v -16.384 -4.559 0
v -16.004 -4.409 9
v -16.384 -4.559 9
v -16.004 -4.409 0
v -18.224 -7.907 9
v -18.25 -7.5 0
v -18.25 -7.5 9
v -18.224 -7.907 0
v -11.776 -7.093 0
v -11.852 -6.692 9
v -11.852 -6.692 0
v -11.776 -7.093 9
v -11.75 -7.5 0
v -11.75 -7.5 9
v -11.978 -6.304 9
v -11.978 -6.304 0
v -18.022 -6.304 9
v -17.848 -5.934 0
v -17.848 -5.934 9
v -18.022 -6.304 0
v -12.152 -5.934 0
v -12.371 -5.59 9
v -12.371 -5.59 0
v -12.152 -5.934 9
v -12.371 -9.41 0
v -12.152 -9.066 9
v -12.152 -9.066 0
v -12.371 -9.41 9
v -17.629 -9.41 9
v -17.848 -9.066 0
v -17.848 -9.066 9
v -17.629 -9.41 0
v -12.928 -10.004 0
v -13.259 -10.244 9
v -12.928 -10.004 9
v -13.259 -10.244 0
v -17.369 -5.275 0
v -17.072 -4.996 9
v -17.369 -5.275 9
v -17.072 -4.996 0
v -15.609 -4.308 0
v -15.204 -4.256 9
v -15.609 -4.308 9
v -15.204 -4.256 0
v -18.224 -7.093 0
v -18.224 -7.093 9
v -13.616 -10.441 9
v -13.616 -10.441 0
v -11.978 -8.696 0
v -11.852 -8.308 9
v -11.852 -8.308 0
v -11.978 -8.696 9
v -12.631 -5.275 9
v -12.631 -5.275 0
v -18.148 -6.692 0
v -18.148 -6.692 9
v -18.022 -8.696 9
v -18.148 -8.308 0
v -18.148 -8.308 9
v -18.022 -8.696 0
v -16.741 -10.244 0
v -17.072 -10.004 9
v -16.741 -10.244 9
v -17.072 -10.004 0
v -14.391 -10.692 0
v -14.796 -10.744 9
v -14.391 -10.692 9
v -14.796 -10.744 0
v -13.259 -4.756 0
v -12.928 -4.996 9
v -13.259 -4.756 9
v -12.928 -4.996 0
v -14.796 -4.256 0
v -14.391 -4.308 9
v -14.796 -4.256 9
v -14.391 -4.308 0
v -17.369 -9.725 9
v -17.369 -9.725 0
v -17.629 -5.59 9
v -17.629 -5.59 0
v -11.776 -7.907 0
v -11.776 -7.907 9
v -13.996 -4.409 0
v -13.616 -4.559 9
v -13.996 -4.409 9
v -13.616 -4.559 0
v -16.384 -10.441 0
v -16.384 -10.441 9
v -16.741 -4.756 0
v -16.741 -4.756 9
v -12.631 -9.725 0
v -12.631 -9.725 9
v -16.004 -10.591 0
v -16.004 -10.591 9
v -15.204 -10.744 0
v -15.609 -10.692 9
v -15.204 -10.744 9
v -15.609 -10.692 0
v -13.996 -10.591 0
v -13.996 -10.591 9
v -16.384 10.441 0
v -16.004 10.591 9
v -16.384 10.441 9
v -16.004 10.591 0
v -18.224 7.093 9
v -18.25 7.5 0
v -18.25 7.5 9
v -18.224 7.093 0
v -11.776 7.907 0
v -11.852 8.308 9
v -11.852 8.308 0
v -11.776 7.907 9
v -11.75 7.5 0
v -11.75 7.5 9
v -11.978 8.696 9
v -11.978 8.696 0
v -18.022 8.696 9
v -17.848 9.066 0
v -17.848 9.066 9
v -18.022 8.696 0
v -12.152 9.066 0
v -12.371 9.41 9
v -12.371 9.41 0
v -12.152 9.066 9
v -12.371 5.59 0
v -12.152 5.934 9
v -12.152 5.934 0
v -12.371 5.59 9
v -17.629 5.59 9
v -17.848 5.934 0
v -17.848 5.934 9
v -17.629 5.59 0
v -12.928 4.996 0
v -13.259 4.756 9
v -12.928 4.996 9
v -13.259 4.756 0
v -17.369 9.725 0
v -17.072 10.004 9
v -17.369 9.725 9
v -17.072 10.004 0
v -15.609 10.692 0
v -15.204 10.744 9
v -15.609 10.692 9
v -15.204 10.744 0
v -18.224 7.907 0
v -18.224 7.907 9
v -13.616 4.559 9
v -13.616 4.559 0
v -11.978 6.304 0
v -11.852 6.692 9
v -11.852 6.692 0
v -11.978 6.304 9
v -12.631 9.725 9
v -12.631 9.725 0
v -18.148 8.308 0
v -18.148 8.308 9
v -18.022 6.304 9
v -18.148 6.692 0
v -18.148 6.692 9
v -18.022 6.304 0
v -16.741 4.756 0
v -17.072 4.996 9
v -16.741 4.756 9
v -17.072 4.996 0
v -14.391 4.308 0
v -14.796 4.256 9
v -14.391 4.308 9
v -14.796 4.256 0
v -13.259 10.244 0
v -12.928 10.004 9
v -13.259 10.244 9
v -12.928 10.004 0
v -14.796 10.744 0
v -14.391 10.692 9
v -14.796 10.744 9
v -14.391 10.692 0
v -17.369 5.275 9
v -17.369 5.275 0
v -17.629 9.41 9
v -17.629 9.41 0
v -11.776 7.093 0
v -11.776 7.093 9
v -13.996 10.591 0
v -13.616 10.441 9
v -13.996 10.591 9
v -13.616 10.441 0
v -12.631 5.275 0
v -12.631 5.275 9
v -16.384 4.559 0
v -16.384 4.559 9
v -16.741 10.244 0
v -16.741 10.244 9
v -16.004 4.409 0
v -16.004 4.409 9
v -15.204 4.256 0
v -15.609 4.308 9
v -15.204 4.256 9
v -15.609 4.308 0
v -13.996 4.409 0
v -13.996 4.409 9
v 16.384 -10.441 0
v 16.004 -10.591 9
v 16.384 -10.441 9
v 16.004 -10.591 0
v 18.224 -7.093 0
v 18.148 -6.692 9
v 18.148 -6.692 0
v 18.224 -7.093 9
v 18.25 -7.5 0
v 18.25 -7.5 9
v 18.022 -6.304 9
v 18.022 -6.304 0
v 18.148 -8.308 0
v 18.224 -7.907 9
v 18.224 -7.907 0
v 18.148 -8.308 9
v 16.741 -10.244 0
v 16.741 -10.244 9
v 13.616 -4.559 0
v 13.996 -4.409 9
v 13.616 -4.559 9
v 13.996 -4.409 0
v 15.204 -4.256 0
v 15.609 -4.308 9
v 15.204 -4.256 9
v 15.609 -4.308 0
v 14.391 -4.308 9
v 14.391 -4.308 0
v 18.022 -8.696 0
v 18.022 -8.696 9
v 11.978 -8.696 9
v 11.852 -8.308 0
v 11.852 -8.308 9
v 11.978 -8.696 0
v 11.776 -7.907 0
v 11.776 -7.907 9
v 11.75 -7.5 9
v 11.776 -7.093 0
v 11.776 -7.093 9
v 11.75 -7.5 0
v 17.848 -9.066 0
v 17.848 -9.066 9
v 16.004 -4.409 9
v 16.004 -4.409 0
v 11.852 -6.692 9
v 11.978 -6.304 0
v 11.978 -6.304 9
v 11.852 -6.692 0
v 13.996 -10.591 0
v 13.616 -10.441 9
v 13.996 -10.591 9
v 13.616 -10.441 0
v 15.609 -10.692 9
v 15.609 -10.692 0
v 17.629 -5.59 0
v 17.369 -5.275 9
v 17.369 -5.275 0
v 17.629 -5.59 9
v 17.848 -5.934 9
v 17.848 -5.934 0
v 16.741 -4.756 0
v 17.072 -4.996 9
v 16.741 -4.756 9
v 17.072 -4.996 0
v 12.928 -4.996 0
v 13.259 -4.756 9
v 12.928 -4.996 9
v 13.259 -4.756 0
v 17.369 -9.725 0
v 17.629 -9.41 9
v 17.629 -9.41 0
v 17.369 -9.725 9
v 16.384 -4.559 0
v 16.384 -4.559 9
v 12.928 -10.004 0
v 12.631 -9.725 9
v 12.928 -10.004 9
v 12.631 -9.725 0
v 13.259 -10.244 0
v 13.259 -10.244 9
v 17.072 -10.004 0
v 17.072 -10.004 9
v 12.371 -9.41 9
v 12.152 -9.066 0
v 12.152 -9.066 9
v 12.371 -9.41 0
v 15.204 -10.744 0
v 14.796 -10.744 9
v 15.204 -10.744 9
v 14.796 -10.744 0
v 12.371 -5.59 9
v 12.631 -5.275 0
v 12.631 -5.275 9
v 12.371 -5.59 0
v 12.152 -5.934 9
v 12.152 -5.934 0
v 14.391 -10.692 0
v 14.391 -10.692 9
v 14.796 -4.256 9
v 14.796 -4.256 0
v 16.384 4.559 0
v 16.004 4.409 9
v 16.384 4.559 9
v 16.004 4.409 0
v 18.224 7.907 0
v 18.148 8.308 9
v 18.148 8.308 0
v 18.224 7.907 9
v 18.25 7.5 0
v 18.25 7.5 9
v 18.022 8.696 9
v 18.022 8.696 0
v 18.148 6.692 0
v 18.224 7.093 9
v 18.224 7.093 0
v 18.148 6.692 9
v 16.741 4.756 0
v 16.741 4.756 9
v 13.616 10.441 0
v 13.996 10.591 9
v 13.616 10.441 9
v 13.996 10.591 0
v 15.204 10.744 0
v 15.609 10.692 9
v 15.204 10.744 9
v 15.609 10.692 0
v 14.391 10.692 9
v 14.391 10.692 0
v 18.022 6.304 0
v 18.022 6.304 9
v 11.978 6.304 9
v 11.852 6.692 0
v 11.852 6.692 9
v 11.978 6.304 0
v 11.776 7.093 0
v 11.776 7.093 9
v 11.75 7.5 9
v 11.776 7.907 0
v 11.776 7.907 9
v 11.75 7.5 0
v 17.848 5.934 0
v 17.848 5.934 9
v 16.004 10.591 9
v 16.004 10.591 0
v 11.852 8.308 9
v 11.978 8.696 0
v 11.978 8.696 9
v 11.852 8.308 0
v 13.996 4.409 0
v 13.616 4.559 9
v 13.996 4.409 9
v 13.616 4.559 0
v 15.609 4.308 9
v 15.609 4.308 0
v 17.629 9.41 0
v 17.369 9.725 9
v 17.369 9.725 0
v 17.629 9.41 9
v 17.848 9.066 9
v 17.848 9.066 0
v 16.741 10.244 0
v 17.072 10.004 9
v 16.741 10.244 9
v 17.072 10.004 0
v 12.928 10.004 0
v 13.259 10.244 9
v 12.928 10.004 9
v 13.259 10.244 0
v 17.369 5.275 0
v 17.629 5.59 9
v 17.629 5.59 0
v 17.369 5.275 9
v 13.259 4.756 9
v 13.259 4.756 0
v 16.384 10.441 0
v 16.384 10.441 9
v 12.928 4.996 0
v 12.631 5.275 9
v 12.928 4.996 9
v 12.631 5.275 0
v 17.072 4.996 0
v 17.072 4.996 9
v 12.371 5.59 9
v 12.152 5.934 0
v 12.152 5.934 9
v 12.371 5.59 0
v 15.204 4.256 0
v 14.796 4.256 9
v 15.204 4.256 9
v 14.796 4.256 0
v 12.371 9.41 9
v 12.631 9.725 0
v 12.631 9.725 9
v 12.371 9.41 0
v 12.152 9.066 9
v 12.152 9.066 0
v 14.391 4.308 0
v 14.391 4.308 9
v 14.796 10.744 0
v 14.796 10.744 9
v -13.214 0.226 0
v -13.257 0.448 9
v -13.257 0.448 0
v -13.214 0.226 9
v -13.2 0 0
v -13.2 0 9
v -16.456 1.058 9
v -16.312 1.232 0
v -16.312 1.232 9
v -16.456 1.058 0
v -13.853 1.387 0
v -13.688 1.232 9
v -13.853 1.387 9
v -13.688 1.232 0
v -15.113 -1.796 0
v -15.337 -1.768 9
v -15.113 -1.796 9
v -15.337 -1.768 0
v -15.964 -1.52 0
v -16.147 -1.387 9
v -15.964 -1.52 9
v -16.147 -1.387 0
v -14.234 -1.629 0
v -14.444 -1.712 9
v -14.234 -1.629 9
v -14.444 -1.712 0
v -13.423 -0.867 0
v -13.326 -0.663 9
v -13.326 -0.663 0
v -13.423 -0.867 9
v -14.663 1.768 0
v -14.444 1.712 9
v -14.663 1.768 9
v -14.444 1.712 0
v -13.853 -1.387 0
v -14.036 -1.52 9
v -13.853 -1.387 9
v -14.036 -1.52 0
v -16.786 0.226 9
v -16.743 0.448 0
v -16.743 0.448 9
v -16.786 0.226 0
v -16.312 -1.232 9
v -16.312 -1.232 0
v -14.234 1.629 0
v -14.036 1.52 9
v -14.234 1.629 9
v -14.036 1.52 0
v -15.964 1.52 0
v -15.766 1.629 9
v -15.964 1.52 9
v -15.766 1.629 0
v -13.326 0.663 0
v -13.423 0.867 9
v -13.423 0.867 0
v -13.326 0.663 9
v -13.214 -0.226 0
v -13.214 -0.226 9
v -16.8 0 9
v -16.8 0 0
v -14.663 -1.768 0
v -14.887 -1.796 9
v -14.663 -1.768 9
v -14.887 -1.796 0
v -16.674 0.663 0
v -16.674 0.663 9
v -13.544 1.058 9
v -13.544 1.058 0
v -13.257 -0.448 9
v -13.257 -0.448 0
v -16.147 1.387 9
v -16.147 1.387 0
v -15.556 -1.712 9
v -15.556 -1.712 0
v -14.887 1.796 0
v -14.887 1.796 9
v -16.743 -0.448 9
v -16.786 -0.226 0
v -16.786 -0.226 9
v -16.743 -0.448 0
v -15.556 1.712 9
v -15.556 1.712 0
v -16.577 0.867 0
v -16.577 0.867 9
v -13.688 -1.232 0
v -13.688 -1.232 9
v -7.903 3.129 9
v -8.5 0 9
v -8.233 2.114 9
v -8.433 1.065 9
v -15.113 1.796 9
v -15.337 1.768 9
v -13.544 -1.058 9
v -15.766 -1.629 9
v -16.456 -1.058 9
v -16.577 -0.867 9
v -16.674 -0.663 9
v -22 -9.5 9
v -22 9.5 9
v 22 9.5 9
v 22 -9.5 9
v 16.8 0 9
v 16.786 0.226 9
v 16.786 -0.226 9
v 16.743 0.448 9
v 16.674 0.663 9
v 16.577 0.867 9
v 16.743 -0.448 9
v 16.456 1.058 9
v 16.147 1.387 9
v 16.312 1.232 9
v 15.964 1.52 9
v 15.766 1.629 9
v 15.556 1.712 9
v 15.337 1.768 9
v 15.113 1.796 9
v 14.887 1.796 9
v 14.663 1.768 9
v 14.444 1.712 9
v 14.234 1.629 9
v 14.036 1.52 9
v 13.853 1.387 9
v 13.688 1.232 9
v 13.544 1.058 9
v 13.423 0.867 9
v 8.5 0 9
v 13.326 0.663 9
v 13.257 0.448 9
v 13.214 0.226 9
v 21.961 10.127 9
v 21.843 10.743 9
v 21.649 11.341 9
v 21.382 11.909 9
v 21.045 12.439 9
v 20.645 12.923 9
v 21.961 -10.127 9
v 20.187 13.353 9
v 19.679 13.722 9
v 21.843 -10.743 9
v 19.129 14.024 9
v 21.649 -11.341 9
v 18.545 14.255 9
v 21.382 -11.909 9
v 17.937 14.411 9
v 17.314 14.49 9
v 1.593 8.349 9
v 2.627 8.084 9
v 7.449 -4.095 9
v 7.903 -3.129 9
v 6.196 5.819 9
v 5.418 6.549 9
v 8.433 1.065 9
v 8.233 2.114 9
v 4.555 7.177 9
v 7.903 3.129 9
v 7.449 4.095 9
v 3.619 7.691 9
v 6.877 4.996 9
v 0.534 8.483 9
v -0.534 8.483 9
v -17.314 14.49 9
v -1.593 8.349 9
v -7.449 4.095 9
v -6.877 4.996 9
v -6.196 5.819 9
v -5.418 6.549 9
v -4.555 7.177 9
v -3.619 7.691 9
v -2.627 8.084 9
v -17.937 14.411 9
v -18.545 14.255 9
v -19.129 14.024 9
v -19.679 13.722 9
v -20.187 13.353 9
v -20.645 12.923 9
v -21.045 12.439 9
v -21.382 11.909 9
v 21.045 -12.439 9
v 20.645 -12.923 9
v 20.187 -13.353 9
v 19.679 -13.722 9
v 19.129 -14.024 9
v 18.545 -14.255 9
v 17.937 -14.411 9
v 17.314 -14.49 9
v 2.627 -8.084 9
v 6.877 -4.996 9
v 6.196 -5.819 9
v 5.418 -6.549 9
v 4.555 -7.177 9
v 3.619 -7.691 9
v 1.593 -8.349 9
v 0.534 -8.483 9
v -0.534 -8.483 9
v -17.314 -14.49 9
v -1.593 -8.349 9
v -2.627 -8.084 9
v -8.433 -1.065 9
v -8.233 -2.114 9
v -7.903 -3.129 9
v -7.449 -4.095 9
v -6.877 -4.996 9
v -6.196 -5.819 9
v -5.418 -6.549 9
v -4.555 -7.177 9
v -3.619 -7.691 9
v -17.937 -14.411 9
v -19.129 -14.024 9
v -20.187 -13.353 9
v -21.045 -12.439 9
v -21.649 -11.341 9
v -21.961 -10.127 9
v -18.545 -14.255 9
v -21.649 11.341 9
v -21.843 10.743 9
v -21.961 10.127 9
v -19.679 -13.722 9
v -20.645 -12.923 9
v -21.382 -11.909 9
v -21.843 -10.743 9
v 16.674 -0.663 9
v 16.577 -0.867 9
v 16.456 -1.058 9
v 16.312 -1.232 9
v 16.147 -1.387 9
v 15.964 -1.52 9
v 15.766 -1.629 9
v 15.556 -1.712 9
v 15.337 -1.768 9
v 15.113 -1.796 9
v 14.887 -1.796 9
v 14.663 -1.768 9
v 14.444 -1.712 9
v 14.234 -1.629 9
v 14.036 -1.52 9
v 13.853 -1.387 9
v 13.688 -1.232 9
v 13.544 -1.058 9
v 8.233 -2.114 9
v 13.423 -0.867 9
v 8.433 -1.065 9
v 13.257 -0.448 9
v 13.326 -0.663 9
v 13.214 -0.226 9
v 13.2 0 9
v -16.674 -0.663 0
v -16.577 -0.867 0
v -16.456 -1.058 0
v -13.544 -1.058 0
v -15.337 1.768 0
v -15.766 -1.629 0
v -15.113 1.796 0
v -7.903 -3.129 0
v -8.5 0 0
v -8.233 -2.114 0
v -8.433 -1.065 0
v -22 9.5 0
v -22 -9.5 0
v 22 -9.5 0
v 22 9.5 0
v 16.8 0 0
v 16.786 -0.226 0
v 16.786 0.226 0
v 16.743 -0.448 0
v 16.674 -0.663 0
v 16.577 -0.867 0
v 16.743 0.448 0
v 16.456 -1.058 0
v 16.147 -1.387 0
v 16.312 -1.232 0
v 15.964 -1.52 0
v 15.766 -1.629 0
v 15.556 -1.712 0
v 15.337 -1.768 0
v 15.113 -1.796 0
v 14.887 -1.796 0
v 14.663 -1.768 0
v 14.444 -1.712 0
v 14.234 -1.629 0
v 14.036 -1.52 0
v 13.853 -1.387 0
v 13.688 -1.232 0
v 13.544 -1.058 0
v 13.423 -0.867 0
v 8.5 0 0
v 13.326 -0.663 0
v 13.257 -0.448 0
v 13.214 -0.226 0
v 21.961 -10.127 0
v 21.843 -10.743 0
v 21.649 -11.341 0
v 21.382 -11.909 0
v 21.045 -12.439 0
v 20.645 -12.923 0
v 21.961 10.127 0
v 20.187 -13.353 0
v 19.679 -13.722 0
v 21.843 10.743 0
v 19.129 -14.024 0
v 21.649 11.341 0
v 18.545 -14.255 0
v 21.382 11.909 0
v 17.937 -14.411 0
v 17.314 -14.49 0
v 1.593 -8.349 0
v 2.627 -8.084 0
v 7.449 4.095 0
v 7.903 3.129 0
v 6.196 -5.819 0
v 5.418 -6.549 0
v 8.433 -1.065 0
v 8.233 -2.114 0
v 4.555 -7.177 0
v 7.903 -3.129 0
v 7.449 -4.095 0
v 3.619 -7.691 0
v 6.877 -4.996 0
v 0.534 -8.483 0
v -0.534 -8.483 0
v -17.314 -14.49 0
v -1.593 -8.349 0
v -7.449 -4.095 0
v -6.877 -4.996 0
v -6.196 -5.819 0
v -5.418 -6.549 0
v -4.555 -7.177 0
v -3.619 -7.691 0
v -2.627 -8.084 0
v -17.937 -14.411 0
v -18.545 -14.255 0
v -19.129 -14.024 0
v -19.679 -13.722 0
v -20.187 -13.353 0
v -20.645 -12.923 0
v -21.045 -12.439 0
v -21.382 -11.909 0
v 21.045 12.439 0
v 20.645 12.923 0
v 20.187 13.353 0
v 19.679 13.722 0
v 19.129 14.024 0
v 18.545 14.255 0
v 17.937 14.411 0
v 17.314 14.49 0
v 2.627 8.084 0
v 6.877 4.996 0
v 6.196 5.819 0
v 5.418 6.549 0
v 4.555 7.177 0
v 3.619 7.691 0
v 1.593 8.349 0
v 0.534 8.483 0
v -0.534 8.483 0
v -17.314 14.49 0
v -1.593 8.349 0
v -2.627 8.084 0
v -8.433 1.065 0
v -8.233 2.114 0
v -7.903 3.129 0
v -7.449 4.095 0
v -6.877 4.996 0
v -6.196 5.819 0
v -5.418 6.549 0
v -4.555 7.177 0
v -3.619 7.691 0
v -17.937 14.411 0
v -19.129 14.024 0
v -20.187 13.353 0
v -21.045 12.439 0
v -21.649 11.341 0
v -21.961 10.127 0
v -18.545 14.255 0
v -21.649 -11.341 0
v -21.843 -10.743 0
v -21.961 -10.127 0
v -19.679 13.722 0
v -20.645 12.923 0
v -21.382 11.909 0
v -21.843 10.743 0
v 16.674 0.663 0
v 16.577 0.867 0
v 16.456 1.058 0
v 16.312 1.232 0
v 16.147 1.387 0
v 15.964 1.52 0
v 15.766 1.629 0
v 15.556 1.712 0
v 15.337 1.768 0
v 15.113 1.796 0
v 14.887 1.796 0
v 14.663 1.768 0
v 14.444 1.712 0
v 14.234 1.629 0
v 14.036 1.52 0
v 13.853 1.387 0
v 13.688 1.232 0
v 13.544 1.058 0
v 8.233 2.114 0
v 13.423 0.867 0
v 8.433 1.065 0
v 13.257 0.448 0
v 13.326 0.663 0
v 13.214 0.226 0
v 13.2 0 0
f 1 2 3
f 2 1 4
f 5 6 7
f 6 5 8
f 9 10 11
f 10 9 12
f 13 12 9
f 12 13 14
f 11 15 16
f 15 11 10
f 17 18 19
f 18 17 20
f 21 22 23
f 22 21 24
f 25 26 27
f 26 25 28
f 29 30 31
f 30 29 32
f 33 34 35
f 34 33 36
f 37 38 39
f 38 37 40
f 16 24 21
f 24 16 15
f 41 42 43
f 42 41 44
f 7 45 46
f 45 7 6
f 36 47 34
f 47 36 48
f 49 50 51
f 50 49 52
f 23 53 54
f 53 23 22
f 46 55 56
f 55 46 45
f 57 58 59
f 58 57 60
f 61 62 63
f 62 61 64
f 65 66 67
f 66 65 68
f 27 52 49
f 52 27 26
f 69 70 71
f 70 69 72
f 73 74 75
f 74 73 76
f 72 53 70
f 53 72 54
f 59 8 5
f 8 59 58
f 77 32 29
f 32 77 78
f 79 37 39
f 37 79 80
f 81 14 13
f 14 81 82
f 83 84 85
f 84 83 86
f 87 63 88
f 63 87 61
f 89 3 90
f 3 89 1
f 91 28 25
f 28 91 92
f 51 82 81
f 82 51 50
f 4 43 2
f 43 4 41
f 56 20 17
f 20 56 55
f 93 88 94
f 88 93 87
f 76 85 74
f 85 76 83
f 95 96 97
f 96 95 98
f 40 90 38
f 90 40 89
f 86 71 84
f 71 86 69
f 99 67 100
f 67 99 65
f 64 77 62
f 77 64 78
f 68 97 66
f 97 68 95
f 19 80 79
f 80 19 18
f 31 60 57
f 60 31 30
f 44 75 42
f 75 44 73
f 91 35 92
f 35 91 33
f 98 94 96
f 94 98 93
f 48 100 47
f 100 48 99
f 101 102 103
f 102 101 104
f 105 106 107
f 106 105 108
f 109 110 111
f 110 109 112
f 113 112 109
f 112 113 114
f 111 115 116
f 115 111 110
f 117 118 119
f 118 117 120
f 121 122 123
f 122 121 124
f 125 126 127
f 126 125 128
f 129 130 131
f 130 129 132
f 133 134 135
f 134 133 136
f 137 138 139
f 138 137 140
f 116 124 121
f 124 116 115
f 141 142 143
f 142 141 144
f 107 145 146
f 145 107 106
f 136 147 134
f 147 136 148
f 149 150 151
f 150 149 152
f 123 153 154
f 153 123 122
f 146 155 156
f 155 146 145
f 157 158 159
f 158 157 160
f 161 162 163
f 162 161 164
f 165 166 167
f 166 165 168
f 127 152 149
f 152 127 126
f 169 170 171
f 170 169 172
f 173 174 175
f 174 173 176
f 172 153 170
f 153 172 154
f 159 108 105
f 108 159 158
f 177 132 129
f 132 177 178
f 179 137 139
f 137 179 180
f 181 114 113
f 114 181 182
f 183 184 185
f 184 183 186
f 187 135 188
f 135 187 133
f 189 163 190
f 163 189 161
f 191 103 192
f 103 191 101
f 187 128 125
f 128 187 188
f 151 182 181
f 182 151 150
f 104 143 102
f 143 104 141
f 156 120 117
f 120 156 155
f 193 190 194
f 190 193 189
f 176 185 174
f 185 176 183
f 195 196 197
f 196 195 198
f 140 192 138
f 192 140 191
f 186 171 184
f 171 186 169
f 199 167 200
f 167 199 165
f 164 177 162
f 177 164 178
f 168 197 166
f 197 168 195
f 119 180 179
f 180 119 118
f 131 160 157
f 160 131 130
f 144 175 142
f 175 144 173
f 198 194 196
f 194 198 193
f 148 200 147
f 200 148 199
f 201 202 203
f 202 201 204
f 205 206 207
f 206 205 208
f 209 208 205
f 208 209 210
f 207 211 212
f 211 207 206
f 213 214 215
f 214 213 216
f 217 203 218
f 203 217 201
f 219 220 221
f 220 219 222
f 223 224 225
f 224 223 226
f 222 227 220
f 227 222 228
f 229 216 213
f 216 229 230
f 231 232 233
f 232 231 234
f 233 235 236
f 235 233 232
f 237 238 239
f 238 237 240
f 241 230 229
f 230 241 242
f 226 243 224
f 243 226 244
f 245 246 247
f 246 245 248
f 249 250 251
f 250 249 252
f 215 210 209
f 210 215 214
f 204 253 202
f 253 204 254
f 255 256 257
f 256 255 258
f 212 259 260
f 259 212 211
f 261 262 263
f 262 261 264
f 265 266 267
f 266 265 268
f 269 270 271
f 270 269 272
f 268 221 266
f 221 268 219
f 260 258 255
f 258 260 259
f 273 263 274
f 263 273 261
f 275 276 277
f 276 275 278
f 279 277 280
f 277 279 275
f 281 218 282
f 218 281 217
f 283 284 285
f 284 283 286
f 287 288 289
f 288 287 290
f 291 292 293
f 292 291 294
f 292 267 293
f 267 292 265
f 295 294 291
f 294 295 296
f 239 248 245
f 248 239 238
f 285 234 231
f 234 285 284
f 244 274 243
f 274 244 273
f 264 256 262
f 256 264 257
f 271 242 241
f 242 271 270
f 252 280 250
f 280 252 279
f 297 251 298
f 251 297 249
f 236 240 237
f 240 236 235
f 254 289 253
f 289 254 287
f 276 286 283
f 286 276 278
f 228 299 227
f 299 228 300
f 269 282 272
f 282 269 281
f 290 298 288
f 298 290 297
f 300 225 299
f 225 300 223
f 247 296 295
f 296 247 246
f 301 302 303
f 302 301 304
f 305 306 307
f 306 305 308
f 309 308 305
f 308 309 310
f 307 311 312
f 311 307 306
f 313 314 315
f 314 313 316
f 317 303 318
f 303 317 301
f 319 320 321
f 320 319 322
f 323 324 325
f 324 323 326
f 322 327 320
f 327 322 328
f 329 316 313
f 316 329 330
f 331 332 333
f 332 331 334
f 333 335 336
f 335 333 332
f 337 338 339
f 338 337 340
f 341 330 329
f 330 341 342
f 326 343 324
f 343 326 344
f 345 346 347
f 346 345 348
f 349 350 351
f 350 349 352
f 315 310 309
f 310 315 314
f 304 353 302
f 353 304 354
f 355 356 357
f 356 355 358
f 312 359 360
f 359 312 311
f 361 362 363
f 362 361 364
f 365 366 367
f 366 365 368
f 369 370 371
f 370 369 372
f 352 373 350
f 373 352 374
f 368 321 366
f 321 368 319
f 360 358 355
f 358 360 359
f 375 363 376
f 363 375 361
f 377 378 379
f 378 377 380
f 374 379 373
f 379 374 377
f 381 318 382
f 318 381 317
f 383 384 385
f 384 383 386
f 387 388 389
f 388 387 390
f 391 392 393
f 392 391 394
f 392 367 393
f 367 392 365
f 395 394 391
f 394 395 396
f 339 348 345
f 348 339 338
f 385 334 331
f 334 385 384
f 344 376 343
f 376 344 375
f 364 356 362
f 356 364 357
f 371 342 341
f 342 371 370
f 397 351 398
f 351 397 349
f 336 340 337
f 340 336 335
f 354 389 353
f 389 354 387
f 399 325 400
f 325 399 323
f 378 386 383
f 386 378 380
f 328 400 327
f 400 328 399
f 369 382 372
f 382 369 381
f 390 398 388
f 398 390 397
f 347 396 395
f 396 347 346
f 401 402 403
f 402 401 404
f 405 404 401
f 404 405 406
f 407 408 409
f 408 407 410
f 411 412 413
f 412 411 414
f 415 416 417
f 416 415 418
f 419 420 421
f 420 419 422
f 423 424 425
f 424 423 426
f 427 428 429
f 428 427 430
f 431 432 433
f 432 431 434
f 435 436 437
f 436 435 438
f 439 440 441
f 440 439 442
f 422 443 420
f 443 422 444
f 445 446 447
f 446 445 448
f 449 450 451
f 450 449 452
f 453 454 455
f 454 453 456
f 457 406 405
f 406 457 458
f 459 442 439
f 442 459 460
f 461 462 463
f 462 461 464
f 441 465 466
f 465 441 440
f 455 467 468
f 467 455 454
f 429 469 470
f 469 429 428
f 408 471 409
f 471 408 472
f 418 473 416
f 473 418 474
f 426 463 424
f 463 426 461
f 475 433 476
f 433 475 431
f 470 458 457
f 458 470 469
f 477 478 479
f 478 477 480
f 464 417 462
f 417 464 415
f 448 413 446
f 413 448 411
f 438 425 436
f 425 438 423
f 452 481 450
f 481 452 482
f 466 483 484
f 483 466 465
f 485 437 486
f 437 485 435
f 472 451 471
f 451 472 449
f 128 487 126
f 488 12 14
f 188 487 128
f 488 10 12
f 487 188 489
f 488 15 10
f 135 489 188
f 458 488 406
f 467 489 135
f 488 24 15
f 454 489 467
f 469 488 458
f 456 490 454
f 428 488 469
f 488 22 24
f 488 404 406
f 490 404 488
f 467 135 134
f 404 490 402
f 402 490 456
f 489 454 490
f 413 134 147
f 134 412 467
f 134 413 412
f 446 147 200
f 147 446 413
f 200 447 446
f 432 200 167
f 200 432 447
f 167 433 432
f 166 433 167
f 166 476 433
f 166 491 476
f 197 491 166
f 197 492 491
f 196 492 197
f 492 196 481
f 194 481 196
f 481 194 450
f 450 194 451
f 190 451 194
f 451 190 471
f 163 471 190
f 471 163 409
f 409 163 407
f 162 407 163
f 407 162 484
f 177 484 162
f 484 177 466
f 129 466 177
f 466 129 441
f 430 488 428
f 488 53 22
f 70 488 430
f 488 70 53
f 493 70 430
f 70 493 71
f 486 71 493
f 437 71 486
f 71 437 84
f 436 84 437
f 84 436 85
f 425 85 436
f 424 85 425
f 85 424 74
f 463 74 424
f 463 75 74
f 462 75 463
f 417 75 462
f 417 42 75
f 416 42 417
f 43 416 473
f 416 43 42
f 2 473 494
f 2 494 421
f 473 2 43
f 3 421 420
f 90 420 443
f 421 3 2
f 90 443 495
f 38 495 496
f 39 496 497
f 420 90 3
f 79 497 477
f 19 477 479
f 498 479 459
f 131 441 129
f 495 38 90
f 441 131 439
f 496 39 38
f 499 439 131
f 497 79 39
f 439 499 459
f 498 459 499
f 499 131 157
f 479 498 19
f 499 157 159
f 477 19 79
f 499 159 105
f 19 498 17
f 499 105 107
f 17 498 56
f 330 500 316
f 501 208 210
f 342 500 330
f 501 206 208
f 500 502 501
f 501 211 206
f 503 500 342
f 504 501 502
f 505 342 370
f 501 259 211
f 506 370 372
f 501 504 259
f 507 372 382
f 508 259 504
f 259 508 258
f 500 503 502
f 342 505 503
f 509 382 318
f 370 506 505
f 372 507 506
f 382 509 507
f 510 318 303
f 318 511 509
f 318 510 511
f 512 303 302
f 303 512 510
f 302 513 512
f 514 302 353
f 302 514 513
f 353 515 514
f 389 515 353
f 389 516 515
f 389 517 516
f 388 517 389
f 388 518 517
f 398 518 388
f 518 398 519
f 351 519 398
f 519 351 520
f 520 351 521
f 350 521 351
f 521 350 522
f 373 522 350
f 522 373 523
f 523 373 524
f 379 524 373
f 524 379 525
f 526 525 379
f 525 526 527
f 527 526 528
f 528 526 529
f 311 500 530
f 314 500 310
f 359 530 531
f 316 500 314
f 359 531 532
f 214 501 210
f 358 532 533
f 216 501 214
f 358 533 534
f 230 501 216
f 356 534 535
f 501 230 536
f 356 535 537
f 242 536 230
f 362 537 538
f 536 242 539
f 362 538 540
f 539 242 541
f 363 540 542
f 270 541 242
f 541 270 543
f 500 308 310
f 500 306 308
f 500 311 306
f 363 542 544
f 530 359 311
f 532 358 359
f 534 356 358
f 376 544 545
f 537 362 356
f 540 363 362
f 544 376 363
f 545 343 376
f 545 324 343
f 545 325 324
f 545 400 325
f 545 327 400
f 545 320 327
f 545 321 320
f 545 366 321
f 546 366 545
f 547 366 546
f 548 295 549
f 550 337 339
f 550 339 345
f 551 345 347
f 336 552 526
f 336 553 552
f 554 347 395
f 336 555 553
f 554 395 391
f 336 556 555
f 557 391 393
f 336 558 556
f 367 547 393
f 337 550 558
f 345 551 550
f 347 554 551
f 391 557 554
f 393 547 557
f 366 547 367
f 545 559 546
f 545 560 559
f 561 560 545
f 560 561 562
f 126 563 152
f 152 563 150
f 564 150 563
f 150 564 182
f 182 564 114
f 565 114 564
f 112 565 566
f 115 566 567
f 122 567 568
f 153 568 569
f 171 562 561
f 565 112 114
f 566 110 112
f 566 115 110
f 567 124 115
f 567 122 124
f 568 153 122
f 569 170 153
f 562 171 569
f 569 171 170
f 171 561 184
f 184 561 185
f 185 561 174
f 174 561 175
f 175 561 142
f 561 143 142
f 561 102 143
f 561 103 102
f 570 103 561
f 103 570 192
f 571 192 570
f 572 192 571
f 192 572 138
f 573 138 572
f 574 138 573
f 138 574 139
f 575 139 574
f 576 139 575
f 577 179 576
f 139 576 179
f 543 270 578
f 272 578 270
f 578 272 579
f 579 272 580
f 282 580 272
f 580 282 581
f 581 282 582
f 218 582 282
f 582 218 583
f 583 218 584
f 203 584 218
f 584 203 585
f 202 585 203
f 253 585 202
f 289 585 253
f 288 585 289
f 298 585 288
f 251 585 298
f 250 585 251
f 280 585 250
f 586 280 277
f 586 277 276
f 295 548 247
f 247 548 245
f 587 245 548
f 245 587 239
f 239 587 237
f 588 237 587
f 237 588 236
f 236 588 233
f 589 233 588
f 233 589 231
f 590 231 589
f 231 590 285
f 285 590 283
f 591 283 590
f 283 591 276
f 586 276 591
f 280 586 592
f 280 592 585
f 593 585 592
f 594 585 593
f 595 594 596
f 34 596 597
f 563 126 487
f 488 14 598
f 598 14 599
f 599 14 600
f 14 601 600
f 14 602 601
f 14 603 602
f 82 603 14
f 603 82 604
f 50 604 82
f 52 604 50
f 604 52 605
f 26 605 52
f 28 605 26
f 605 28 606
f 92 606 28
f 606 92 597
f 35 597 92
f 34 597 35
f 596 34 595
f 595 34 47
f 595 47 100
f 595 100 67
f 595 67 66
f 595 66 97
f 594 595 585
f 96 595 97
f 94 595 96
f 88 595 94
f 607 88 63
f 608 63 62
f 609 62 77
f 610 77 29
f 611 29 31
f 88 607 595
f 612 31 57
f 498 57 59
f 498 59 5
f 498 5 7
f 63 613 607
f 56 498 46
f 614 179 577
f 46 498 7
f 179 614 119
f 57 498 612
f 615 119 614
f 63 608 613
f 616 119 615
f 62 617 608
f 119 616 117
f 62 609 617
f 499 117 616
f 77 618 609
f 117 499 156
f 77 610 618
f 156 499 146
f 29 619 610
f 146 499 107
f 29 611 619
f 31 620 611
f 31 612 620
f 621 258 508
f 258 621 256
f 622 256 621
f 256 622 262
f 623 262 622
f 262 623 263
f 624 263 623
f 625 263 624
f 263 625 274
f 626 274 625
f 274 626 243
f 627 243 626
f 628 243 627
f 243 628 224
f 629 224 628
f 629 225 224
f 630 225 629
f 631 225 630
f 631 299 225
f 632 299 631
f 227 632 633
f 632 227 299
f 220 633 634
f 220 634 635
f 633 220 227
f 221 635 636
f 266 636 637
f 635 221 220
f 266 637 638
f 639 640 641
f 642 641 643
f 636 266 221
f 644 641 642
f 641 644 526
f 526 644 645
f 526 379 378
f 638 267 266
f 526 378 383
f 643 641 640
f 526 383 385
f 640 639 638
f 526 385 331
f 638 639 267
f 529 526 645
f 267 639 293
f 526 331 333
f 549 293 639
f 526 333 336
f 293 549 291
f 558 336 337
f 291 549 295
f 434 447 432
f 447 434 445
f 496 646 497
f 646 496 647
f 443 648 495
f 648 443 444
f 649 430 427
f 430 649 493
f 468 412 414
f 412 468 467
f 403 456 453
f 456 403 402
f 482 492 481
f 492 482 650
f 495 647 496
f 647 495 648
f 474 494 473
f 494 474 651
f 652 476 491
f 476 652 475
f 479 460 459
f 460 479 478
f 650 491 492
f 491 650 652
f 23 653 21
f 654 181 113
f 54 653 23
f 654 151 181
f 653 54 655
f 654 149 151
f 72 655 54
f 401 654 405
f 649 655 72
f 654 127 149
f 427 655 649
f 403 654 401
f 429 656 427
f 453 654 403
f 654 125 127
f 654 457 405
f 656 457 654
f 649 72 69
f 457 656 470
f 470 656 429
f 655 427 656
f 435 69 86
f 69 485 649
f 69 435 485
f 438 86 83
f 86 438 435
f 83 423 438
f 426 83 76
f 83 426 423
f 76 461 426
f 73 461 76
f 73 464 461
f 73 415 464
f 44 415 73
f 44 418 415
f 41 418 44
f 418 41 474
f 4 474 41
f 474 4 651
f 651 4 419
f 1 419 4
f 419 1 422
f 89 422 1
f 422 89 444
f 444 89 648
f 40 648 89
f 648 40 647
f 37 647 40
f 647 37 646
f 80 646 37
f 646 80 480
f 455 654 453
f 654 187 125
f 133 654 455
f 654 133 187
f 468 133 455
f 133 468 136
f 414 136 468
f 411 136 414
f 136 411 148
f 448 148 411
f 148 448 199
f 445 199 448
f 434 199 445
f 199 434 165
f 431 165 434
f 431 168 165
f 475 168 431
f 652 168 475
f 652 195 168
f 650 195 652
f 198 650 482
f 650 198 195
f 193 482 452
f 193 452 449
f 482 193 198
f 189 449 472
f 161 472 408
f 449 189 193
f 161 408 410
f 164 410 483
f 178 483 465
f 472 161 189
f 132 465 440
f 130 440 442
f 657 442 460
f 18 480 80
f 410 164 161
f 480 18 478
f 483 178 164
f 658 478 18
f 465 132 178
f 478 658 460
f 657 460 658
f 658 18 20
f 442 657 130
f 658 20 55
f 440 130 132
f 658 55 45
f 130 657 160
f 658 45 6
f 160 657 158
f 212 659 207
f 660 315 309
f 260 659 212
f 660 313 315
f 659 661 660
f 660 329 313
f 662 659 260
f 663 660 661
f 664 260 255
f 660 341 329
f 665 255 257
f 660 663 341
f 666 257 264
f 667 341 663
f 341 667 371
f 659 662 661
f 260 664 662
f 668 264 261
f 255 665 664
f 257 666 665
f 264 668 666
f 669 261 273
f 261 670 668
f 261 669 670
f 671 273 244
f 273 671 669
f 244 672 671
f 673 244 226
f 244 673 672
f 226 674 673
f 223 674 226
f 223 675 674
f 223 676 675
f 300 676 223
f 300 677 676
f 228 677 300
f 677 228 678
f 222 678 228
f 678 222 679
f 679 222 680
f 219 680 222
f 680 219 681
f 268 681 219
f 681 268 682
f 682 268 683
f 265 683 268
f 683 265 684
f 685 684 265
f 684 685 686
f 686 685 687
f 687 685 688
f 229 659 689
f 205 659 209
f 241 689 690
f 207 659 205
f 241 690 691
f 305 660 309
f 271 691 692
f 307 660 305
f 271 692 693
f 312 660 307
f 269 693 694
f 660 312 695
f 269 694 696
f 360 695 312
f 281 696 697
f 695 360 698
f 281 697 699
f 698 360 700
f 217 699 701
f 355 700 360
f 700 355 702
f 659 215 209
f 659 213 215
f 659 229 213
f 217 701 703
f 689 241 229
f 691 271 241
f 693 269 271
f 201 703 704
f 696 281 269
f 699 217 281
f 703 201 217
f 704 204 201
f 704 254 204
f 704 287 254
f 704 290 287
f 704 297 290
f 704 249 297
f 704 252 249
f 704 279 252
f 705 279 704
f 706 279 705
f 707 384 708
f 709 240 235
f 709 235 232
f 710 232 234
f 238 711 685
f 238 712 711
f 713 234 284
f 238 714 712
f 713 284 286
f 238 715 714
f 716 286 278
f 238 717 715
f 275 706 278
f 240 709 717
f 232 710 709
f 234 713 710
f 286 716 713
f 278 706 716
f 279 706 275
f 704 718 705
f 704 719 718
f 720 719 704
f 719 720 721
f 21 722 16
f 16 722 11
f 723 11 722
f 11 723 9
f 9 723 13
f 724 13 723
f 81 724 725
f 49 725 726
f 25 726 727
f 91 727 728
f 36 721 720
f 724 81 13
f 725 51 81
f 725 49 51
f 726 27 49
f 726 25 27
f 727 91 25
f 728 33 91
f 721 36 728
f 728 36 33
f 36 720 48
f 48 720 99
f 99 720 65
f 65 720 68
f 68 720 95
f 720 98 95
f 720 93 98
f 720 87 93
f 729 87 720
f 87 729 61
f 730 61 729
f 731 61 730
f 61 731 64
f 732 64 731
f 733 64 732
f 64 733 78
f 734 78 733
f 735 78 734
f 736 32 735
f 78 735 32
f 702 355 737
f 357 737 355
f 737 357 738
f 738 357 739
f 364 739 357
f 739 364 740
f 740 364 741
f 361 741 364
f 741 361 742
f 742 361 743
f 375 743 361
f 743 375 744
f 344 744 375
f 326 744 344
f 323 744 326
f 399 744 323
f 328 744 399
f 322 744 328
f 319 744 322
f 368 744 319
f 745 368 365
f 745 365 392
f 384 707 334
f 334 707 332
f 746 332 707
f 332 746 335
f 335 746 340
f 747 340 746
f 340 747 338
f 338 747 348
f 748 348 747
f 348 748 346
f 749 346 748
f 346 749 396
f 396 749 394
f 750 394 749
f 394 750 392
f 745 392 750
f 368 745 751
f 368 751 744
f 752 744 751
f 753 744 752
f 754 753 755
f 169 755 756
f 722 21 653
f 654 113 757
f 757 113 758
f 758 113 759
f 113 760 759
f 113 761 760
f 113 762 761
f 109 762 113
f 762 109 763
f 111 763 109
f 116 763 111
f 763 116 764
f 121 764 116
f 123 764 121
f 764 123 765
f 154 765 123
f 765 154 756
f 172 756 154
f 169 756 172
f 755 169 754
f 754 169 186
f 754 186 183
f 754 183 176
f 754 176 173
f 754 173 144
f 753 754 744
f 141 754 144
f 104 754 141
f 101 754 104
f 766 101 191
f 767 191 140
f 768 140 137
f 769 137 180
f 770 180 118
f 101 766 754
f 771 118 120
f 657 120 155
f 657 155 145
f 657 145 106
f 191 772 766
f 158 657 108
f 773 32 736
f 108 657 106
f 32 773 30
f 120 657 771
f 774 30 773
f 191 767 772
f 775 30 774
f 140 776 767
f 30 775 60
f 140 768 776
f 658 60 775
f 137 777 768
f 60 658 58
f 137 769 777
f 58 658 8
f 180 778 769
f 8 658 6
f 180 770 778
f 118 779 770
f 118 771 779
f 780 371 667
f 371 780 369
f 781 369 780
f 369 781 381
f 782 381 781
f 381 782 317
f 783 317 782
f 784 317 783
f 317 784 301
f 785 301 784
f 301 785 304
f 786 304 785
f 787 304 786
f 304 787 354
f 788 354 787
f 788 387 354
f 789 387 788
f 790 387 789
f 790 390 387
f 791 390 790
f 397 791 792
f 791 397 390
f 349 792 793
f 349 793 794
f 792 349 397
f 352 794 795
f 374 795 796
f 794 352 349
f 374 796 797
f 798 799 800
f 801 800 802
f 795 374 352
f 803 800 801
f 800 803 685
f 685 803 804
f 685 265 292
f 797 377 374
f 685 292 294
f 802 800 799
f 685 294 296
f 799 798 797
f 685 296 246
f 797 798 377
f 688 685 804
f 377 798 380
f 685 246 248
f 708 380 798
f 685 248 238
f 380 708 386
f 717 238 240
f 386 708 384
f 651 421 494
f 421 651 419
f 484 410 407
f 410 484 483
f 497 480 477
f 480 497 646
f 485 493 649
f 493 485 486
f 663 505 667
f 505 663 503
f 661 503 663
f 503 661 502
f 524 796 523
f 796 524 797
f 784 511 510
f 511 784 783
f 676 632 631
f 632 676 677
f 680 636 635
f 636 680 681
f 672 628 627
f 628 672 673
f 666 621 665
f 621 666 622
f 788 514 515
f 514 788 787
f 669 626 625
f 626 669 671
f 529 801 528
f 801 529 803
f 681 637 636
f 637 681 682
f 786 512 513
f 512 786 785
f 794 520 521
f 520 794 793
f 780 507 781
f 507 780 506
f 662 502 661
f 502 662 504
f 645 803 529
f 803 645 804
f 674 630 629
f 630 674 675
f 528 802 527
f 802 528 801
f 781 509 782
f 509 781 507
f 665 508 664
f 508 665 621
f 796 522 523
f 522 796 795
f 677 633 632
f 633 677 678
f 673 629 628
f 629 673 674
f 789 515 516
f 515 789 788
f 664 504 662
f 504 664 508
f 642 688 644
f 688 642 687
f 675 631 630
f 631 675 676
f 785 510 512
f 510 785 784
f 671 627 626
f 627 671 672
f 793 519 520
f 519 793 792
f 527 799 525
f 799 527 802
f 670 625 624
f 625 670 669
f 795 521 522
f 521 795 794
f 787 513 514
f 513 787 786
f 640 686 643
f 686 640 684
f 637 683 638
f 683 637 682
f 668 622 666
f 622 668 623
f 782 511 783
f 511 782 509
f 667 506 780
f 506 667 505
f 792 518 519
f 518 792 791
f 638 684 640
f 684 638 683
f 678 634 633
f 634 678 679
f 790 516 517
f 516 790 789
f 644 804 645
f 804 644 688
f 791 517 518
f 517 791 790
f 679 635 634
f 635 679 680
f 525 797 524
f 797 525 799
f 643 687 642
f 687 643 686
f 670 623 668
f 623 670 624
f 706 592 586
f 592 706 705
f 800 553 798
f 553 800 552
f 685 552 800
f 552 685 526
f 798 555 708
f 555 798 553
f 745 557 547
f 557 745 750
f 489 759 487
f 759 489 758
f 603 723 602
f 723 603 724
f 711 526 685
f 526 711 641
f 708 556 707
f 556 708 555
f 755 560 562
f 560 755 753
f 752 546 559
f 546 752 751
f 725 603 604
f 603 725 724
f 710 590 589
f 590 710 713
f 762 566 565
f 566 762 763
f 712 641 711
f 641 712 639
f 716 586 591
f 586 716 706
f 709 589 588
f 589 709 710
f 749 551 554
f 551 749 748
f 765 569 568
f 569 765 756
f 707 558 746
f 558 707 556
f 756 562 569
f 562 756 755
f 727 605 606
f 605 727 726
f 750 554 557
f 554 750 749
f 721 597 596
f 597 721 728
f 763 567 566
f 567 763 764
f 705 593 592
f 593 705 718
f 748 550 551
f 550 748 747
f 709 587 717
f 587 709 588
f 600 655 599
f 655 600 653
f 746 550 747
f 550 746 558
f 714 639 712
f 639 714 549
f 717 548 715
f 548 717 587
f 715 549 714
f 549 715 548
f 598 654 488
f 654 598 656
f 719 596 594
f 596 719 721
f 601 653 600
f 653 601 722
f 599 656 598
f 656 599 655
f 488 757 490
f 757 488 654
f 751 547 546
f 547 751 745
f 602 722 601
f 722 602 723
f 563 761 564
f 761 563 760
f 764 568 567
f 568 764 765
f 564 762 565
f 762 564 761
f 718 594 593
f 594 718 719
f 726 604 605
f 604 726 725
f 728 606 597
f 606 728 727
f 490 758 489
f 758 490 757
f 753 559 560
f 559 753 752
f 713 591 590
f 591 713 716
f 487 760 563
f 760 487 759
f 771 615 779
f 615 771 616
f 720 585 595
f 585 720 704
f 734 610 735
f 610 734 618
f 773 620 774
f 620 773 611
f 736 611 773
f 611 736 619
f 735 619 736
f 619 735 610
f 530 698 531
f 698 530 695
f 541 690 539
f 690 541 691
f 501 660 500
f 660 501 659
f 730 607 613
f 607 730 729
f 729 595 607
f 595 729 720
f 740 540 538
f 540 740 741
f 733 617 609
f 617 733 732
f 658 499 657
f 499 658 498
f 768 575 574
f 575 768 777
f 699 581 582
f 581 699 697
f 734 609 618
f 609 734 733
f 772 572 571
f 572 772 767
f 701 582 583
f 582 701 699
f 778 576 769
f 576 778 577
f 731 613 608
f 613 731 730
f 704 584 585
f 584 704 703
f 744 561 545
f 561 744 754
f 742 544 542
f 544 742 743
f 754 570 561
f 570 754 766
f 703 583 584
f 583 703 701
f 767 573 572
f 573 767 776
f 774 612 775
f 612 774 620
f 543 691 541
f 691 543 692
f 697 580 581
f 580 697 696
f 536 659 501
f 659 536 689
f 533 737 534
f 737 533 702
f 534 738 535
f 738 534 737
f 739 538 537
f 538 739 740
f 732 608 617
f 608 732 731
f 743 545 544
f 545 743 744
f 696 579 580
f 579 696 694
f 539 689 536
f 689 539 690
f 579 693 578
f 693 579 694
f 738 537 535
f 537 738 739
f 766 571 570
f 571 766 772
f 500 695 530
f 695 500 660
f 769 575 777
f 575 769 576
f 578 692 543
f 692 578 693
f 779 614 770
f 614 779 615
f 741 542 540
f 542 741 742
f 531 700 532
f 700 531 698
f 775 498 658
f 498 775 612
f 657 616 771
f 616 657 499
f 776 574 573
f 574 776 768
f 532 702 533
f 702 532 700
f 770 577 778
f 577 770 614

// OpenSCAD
$fn = 50;


difference() {
	union() {
		hull() {
			translate(v = [-17.0000000000, 9.5000000000, 0]) {
				cylinder(h = 9, r = 5);
			}
			translate(v = [17.0000000000, 9.5000000000, 0]) {
				cylinder(h = 9, r = 5);
			}
			translate(v = [-17.0000000000, -9.5000000000, 0]) {
				cylinder(h = 9, r = 5);
			}
			translate(v = [17.0000000000, -9.5000000000, 0]) {
				cylinder(h = 9, r = 5);
			}
		}
	}
	union() {
		#translate(v = [-15.0000000000, -7.5000000000, 0]) {
			cylinder(h = 9, r = 3.2500000000);
		}
		#translate(v = [-15.0000000000, 7.5000000000, 0]) {
			cylinder(h = 9, r = 3.2500000000);
		}
		#translate(v = [15.0000000000, -7.5000000000, 0]) {
			cylinder(h = 9, r = 3.2500000000);
		}
		#translate(v = [15.0000000000, 7.5000000000, 0]) {
			cylinder(h = 9, r = 3.2500000000);
		}
		#translate(v = [-15.0000000000, -7.5000000000, -100.0000000000]) {
			cylinder(h = 200, r = 3.2500000000);
		}
		#translate(v = [-15.0000000000, 7.5000000000, -100.0000000000]) {
			cylinder(h = 200, r = 3.2500000000);
		}
		#translate(v = [15.0000000000, -7.5000000000, -100.0000000000]) {
			cylinder(h = 200, r = 3.2500000000);
		}
		#translate(v = [15.0000000000, 7.5000000000, -100.0000000000]) {
			cylinder(h = 200, r = 3.2500000000);
		}
		#translate(v = [-15.0000000000, -7.5000000000, 0]) {
			cylinder(h = 9, r = 1.8000000000);
		}
		#translate(v = [-15.0000000000, 0.0000000000, 0]) {
			cylinder(h = 9, r = 1.8000000000);
		}
		#translate(v = [-15.0000000000, 7.5000000000, 0]) {
			cylinder(h = 9, r = 1.8000000000);
		}
		#translate(v = [15.0000000000, -7.5000000000, 0]) {
			cylinder(h = 9, r = 1.8000000000);
		}
		#translate(v = [15.0000000000, 0.0000000000, 0]) {
			cylinder(h = 9, r = 1.8000000000);
		}
		#translate(v = [15.0000000000, 7.5000000000, 0]) {
			cylinder(h = 9, r = 1.8000000000);
		}
		#translate(v = [-15.0000000000, -7.5000000000, 0]) {
			cylinder(h = 9, r = 1.8000000000);
		}
		#translate(v = [-15.0000000000, 0.0000000000, 0]) {
			cylinder(h = 9, r = 1.8000000000);
		}
		#translate(v = [-15.0000000000, 7.5000000000, 0]) {
			cylinder(h = 9, r = 1.8000000000);
		}
		#translate(v = [15.0000000000, -7.5000000000, 0]) {
			cylinder(h = 9, r = 1.8000000000);
		}
		#translate(v = [15.0000000000, 0.0000000000, 0]) {
			cylinder(h = 9, r = 1.8000000000);
		}
		#translate(v = [15.0000000000, 7.5000000000, 0]) {
			cylinder(h = 9, r = 1.8000000000);
		}
		#translate(v = [-15.0000000000, -7.5000000000, 0]) {
			cylinder(h = 9, r = 1.8000000000);
		}
		#translate(v = [-15.0000000000, 0.0000000000, 0]) {
			cylinder(h = 9, r = 1.8000000000);
		}
		#translate(v = [-15.0000000000, 7.5000000000, 0]) {
			cylinder(h = 9, r = 1.8000000000);
		}
		#translate(v = [15.0000000000, -7.5000000000, 0]) {
			cylinder(h = 9, r = 1.8000000000);
		}
		#translate(v = [15.0000000000, 0.0000000000, 0]) {
			cylinder(h = 9, r = 1.8000000000);
		}
		#translate(v = [15.0000000000, 7.5000000000, 0]) {
			cylinder(h = 9, r = 1.8000000000);
		}
		#cylinder(h = 9, r = 8.5000000000);
	}
}
